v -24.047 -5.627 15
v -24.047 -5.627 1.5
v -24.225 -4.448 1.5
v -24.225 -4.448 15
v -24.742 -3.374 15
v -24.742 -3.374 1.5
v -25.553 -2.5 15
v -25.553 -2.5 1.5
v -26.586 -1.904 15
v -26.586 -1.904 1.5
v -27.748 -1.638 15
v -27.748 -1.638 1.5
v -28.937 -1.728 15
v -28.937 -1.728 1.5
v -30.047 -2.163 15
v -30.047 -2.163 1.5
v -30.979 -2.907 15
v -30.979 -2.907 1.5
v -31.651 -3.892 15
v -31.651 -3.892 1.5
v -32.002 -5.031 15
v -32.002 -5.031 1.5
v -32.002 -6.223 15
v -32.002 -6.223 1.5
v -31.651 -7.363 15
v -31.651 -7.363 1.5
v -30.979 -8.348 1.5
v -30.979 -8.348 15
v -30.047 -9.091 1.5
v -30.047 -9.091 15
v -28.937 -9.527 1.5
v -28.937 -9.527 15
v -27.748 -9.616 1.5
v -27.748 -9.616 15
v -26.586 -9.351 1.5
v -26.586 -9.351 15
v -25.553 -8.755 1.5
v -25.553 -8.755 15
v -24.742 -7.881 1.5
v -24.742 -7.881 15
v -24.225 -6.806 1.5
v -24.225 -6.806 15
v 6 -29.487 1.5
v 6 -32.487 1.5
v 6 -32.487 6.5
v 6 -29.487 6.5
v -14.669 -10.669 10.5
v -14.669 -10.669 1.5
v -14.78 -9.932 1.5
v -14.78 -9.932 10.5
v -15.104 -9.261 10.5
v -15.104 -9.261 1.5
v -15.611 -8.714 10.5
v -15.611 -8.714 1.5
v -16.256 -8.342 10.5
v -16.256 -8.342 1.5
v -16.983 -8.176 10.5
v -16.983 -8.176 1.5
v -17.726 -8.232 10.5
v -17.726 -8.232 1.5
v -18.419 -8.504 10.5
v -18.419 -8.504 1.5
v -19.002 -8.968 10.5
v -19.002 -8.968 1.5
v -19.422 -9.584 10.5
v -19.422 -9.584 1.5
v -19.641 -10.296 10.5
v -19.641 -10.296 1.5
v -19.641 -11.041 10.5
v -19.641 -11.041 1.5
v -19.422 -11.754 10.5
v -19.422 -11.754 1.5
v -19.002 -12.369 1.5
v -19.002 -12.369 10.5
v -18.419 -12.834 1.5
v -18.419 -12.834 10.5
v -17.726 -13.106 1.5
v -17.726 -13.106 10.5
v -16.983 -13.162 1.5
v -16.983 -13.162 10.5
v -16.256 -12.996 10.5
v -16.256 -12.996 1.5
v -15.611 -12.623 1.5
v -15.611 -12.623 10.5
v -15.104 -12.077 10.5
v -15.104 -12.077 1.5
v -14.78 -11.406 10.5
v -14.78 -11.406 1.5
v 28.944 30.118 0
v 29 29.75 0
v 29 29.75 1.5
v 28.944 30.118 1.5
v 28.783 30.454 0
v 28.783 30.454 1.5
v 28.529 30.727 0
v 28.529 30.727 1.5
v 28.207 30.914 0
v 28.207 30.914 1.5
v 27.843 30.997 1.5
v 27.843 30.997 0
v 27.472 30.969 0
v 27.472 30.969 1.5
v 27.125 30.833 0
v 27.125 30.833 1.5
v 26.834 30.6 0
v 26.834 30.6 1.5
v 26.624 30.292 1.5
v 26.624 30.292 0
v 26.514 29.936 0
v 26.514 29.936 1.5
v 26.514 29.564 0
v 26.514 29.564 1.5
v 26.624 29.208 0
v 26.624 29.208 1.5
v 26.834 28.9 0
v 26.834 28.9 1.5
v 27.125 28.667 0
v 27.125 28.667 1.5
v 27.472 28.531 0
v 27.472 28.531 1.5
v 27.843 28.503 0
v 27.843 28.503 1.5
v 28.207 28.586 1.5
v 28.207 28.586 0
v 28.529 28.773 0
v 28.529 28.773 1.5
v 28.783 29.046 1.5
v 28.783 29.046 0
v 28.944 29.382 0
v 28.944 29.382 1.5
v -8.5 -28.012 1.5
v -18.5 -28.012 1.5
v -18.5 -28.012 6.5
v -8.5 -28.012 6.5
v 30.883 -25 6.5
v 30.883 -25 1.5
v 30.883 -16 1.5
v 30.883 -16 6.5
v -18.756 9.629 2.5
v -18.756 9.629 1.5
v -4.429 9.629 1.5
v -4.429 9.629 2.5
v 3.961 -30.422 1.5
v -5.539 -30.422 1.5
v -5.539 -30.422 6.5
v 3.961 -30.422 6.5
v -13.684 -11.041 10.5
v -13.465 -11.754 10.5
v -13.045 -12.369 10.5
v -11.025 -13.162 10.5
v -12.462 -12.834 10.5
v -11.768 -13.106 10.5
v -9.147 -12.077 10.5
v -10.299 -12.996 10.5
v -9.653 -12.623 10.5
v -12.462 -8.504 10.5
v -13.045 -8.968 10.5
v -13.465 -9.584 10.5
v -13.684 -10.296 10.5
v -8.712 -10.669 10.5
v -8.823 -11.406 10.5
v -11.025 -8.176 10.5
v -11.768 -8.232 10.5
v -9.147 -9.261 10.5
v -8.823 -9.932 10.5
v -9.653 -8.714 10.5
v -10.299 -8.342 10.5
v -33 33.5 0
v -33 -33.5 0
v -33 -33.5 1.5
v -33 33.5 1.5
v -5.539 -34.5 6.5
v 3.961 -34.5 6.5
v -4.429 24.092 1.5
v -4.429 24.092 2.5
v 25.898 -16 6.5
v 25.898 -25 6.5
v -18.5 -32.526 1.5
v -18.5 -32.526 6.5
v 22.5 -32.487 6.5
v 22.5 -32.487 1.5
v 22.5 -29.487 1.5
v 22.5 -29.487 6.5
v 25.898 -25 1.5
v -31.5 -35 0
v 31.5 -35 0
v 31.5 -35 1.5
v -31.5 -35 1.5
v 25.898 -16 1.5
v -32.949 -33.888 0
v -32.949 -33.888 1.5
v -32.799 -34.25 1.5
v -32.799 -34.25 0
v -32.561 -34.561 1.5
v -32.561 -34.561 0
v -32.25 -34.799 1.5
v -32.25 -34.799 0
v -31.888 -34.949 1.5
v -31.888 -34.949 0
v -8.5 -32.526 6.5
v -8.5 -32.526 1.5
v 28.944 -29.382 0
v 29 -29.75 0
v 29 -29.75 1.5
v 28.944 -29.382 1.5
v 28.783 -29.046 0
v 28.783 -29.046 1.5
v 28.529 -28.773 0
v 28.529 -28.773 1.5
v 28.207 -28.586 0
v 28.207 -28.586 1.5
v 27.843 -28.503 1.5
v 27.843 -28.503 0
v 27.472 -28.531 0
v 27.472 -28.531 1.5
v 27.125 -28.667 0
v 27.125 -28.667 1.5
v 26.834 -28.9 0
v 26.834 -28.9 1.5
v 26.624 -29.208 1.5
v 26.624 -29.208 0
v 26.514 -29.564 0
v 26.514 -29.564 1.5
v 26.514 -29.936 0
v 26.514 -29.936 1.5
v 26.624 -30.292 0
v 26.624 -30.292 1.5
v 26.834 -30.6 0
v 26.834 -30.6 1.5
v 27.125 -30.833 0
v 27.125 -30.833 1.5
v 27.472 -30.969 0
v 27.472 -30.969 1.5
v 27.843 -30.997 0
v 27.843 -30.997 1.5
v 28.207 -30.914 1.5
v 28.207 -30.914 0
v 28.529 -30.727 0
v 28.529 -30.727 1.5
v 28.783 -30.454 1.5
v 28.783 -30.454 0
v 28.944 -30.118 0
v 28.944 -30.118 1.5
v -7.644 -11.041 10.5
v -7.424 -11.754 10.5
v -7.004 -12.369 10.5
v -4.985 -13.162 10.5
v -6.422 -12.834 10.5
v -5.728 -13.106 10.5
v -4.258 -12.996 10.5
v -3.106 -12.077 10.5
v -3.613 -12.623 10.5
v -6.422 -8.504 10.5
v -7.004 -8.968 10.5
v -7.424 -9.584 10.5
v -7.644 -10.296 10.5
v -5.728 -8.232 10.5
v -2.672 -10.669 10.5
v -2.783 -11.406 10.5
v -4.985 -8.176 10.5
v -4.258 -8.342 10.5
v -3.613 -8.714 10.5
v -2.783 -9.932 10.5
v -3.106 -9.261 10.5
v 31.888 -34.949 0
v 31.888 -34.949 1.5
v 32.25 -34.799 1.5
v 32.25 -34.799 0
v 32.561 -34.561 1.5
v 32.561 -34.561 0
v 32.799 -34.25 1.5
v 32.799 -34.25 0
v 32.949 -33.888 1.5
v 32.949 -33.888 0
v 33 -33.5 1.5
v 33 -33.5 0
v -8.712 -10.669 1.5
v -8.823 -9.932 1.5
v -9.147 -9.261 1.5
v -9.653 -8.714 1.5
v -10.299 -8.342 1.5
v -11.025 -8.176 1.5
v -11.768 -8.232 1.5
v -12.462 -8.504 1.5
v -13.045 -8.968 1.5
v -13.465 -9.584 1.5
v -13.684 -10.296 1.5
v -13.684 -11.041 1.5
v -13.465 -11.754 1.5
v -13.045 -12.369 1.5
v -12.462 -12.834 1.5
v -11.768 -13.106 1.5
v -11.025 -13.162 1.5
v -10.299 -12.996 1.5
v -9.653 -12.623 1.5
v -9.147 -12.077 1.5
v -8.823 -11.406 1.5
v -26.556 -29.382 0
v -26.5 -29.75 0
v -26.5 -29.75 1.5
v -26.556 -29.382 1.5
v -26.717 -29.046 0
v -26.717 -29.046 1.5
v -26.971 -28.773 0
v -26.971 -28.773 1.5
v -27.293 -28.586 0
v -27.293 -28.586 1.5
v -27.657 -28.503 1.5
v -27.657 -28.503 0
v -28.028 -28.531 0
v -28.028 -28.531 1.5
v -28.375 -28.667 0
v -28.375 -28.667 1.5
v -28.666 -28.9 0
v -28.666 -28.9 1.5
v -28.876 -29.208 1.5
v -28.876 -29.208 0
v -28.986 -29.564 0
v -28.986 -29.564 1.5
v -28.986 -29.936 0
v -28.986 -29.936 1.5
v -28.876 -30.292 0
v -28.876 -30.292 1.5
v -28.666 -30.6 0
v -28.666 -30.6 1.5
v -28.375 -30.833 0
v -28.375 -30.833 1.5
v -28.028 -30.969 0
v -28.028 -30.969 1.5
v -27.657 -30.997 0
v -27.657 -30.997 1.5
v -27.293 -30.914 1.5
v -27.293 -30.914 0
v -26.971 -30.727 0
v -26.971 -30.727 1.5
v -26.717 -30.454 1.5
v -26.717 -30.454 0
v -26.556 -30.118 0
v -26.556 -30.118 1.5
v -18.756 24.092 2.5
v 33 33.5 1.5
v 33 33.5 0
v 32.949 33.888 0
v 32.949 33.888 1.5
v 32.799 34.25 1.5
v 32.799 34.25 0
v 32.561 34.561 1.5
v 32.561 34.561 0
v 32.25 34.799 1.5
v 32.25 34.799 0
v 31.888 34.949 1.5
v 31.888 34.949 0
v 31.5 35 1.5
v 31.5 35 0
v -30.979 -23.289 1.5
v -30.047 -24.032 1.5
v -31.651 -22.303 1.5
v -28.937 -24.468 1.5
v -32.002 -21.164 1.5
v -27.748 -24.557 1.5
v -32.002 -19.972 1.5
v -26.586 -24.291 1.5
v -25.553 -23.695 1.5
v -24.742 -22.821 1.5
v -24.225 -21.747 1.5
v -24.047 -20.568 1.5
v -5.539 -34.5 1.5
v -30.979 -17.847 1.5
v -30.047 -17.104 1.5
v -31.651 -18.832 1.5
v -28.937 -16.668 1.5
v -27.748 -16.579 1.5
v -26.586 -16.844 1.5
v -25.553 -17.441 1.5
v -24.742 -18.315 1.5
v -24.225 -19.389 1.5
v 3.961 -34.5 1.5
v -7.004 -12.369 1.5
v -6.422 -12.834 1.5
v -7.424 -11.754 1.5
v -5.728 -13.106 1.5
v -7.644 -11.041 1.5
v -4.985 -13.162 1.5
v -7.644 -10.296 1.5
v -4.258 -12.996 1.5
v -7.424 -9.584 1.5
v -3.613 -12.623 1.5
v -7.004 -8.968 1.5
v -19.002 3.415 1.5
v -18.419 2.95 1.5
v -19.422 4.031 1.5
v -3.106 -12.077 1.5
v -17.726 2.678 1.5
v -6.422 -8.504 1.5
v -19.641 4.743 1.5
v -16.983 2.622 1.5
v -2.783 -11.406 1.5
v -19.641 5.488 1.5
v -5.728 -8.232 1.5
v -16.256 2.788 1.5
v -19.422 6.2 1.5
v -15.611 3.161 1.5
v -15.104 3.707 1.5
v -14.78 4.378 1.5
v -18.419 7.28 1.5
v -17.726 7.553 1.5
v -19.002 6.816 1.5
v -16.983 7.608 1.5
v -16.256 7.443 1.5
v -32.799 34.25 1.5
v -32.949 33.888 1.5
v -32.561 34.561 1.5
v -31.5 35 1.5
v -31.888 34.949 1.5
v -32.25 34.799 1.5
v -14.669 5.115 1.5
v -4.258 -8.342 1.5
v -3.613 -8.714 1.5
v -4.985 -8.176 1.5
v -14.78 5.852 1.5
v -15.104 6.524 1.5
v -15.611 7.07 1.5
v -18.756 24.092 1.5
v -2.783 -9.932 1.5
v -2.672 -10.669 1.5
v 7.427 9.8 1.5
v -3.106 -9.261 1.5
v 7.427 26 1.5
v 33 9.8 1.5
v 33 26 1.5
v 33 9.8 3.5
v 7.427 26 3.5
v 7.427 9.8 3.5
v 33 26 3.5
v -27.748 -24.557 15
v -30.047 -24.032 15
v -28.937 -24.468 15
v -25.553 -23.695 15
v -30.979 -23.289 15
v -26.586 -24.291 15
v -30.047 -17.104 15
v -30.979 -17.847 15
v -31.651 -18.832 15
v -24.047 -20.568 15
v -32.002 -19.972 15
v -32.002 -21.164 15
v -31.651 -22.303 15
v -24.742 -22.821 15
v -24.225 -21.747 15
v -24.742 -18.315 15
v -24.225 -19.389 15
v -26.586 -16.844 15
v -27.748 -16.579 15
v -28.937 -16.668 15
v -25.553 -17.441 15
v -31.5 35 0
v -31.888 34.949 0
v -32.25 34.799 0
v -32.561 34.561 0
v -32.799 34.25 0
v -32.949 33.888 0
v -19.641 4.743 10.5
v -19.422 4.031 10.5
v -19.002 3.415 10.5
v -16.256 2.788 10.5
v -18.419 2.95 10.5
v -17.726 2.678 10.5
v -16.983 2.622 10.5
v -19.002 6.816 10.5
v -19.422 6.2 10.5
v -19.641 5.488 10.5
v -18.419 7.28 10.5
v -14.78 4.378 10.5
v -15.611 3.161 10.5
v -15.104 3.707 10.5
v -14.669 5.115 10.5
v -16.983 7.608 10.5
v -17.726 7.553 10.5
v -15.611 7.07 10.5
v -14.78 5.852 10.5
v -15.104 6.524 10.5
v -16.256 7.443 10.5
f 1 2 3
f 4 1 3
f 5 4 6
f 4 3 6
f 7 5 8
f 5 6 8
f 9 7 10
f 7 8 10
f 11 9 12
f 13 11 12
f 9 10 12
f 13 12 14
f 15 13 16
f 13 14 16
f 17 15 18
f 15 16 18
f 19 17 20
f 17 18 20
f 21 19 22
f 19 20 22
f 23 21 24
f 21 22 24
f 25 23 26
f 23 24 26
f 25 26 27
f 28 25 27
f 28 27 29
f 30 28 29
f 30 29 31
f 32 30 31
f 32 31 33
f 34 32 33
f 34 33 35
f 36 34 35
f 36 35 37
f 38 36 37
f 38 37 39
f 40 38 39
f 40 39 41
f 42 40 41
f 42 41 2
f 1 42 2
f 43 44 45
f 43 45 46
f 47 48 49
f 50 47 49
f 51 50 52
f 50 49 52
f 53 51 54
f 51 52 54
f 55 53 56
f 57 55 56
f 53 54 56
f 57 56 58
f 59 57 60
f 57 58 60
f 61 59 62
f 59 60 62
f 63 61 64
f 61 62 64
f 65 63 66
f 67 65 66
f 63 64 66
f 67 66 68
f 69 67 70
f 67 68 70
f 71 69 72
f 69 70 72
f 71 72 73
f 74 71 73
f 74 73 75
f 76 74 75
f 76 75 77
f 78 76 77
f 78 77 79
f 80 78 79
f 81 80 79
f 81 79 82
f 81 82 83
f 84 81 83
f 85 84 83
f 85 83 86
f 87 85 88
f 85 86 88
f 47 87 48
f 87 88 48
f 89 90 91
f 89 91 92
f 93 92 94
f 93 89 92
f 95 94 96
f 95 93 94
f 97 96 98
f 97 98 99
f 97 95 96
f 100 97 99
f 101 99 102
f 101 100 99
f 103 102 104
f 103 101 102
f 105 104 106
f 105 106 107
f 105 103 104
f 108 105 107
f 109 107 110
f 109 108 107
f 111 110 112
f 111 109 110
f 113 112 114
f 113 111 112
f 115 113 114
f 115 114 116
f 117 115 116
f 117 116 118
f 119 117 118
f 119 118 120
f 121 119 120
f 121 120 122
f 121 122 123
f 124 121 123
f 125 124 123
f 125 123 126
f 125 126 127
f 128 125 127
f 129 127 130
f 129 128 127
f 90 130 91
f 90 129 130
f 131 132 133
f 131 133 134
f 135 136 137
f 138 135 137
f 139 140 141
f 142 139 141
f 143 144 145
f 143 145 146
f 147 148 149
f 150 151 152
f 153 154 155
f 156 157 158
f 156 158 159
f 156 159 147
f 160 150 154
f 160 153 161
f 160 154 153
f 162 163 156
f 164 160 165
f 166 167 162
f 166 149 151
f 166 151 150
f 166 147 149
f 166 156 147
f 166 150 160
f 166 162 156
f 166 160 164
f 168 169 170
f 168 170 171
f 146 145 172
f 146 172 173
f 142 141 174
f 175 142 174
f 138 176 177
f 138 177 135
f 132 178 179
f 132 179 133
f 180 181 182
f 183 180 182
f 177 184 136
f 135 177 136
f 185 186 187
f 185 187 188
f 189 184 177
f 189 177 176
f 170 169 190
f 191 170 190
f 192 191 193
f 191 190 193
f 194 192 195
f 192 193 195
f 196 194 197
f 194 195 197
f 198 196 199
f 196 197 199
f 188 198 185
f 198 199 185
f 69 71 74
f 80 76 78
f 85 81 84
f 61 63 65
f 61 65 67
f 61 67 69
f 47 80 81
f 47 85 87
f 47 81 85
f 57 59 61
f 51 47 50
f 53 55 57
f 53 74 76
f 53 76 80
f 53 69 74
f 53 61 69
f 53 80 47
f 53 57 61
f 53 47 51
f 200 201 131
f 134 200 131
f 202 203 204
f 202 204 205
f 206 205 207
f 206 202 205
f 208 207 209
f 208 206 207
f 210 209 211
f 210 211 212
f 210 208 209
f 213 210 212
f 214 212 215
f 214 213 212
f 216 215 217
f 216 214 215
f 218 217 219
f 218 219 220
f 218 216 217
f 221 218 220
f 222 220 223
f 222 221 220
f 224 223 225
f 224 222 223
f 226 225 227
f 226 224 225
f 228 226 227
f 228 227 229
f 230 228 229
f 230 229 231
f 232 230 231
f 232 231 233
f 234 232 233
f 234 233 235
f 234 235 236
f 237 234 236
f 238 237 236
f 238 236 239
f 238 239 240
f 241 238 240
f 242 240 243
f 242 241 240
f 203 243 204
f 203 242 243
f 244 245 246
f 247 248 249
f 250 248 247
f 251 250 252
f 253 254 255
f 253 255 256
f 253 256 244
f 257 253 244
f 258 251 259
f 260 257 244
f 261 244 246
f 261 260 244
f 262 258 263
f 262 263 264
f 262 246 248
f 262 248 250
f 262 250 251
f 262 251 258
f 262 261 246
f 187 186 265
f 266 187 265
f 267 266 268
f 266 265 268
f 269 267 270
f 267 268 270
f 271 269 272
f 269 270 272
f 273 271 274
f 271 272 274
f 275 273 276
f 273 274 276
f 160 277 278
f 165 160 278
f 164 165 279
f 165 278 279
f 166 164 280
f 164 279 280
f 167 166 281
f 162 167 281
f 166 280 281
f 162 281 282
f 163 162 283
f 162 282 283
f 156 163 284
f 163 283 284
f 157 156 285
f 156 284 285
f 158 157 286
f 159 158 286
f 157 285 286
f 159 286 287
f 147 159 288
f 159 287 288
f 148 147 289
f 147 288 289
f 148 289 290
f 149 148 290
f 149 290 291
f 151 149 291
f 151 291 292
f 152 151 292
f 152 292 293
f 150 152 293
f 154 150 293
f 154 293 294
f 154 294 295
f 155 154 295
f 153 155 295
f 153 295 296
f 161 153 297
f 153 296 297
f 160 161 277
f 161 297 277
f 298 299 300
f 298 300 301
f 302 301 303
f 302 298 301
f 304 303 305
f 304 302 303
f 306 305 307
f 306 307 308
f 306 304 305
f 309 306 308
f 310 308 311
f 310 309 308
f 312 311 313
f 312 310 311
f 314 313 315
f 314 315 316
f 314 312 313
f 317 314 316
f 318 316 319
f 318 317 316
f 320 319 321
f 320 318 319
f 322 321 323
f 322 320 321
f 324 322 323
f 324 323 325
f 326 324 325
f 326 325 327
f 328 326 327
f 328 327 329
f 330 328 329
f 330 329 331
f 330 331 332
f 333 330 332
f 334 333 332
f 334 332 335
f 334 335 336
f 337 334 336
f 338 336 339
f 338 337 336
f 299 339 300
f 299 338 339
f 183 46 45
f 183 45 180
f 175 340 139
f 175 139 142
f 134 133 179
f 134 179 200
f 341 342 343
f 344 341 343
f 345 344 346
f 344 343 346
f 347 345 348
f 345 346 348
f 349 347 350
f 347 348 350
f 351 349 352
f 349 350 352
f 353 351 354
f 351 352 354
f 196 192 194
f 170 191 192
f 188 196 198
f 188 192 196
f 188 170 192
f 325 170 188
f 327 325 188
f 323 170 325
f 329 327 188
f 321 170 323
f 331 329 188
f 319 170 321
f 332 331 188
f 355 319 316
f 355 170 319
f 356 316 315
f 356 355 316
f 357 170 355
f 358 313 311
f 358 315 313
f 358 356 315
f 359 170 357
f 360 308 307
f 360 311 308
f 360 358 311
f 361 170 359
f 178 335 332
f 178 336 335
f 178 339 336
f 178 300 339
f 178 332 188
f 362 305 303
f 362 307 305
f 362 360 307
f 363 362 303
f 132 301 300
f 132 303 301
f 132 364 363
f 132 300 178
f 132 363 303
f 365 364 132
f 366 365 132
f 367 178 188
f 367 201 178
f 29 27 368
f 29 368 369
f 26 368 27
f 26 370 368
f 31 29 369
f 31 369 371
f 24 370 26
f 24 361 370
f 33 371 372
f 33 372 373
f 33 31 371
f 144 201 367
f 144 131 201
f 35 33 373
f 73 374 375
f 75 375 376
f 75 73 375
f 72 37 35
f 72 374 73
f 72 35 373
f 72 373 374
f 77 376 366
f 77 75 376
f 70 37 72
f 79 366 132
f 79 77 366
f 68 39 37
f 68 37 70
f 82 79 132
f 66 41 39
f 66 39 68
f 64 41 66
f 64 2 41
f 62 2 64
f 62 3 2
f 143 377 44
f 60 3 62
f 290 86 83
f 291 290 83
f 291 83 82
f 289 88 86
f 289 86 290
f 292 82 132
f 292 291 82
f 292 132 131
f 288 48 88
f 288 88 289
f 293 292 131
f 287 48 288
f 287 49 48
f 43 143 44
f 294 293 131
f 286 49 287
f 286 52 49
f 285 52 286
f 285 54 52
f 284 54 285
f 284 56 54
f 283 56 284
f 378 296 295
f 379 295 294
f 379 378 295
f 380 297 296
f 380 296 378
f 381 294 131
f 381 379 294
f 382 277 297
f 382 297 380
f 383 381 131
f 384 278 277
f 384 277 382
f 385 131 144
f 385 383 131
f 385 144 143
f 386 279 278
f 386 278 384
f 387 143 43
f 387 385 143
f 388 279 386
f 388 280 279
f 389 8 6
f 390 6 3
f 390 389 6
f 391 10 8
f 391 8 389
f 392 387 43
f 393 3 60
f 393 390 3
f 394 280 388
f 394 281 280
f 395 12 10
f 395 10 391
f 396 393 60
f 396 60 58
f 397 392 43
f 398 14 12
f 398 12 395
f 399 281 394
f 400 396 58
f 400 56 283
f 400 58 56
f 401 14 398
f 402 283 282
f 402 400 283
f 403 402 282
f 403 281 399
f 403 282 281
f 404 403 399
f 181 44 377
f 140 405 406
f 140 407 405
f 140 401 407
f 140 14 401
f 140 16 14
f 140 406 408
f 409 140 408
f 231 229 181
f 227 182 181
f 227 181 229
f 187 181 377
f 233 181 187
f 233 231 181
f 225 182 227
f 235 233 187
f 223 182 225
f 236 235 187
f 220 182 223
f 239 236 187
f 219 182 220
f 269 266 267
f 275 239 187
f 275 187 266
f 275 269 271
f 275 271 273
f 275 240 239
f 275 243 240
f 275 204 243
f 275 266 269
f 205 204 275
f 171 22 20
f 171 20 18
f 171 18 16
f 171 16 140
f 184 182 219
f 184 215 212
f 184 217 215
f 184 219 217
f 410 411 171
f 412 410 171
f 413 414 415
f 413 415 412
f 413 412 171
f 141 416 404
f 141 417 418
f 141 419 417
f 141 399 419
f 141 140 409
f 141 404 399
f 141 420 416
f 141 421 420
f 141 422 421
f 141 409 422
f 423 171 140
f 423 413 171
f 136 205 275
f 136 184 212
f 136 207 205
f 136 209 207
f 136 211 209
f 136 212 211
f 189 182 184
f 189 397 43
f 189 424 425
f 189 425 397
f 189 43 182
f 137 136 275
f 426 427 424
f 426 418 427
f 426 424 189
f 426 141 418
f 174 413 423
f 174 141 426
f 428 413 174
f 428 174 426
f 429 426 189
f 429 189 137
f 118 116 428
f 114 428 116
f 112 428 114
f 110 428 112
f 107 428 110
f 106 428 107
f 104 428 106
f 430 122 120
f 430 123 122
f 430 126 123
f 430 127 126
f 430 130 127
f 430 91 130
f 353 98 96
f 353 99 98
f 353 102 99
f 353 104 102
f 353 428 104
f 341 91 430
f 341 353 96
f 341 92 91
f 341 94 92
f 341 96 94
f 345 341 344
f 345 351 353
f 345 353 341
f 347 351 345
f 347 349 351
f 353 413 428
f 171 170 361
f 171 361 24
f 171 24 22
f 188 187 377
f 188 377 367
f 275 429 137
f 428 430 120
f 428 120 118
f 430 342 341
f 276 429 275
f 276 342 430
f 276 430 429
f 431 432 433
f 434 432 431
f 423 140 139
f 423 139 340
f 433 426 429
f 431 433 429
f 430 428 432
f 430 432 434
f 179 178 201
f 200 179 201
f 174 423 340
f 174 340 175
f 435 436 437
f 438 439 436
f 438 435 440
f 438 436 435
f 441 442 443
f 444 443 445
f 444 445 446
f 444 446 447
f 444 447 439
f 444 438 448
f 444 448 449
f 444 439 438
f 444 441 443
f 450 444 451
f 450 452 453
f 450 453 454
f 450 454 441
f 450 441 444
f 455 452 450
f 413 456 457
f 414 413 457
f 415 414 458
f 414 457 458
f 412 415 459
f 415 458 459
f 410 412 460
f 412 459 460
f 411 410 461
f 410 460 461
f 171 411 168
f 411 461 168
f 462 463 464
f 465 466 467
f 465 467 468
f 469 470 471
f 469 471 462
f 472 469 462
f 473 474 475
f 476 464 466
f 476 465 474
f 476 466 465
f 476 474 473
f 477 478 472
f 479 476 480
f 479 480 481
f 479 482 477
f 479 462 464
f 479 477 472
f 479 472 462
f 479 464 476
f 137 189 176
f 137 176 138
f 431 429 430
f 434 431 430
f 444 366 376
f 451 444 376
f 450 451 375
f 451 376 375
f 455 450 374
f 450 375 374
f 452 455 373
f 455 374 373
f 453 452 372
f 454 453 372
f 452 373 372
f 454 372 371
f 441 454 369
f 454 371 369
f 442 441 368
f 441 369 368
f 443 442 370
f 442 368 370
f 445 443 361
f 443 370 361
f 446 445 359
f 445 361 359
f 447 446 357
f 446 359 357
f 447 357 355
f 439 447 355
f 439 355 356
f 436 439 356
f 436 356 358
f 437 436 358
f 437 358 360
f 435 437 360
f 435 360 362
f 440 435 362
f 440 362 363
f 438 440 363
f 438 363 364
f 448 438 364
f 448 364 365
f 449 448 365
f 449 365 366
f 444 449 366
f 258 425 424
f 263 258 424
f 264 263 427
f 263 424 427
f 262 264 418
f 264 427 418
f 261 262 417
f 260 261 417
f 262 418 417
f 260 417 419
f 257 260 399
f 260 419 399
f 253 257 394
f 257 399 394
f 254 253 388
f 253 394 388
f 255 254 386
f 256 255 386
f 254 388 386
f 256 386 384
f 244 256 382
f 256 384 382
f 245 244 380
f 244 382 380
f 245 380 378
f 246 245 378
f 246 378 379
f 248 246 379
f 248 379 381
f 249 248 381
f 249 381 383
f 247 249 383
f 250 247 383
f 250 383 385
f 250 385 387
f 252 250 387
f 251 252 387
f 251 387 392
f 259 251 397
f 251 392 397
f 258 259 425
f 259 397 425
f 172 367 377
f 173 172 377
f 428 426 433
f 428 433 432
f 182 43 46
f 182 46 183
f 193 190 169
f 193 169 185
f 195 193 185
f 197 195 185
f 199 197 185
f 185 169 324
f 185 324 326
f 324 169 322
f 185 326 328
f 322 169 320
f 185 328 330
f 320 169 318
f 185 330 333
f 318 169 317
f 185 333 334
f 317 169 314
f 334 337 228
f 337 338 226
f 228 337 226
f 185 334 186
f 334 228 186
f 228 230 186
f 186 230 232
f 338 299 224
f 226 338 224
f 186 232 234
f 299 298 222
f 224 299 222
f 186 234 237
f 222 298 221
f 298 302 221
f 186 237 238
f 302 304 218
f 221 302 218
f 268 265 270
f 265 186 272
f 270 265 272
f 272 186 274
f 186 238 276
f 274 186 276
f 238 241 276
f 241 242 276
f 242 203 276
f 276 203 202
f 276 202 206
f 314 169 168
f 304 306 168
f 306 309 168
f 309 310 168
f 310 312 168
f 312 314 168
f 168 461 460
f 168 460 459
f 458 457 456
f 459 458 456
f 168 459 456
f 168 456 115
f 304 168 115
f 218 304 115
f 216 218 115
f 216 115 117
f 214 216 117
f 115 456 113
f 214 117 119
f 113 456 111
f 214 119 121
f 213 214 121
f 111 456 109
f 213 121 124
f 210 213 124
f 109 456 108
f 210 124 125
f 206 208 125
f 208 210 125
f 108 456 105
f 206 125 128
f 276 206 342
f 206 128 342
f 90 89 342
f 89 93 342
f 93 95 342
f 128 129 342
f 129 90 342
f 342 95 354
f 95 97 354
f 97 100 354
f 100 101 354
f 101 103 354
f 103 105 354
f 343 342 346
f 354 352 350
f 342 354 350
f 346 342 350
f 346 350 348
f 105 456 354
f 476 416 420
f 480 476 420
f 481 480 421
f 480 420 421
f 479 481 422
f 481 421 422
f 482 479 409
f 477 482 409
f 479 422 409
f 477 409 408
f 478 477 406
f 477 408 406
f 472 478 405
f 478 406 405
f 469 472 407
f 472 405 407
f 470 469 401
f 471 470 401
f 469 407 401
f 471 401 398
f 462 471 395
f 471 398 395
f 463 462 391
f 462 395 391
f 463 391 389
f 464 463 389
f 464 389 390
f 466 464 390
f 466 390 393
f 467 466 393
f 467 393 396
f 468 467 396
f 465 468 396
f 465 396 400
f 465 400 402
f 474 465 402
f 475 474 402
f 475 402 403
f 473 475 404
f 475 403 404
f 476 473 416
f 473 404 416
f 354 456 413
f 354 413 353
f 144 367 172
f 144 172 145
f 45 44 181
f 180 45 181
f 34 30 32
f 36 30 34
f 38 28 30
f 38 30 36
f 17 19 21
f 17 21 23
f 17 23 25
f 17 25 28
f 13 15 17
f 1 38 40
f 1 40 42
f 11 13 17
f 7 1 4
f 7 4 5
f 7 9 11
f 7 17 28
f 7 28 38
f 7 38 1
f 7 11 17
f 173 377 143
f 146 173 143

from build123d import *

# Parameters (mm, degrees)
SKETCH_R      = 1.25
PAD_DEPTH     = 1.5
SKETCH001_R   = 4
PAD001_DEPTH  = 15
SKETCH002_W   = 14.327426
SKETCH002_H   = 14.462592
PAD002_DEPTH  = 1
SKETCH003_R   = 2.5
PAD003_DEPTH  = 9
SKETCH004_W   = 10
SKETCH004_H   = 4.51462
SKETCH004_W_2 = 9.5
SKETCH004_H_2 = 4.078131
SKETCH004_W_3 = 16.5
SKETCH004_H_3 = 3
PAD004_DEPTH  = 5
SKETCH005_W   = 25.572927
SKETCH005_H   = 16.2
PAD005_DEPTH  = 2
SKETCH006_W   = 4.984948
SKETCH006_H   = 9
PAD006_DEPTH  = 5


with BuildPart() as part:
    # Sketch → Pad (new body)
    with BuildSketch(Plane.XY):
        with BuildLine():
            ThreePointArc((-31.5, 35), (-32.56066, 34.56066), (-33, 33.5))
            Line((-33, -33.5), (-33, 33.5))
            ThreePointArc((-33, -33.5), (-32.56066, -34.56066), (-31.5, -35))
            Line((31.5, -35), (-31.5, -35))
            ThreePointArc((31.5, -35), (32.56066, -34.56066), (33, -33.5))
            Line((33, 33.5), (33, -33.5))
            ThreePointArc((33, 33.5), (32.56066, 34.56066), (31.5, 35))
            Line((-31.5, 35), (31.5, 35))
        make_face()
        with Locations((27.75, 29.75)):
            Circle(SKETCH_R, mode=Mode.SUBTRACT)
        with Locations((-27.75, -29.75)):
            Circle(SKETCH_R, mode=Mode.SUBTRACT)
        with Locations((27.75, -29.75)):
            Circle(SKETCH_R, mode=Mode.SUBTRACT)
    extrude(amount=PAD_DEPTH)

    # Sketch001 → Pad001 (join)
    with BuildSketch(Plane.XY):
        with Locations((-28.04706, -5.627252)):
            Circle(SKETCH001_R)
        with Locations((-28.04706, -20.567915)):
            Circle(SKETCH001_R)
    extrude(amount=PAD001_DEPTH)

    # Sketch002 (on DatumPlane) → Pad002 (join)
    with BuildSketch(Plane.XY.offset(1.5)):
        with Locations((-11.592608, 16.860297)):
            Rectangle(SKETCH002_W, SKETCH002_H)
    extrude(amount=PAD002_DEPTH)

    # Sketch003 (on DatumPlane) → Pad003 (join)
    with BuildSketch(Plane.XY.offset(1.5)):
        with Locations((-17.169403, 5.115318)):
            Circle(SKETCH003_R)
        with Locations((-17.169403, -10.668831)):
            Circle(SKETCH003_R)
        with Locations((-11.212177, -10.668831)):
            Circle(SKETCH003_R)
        with Locations((-5.171722, -10.668831)):
            Circle(SKETCH003_R)
    extrude(amount=PAD003_DEPTH)

    # Sketch004 (on DatumPlane) → Pad004 (join)
    with BuildSketch(Plane.XY.offset(1.5)):
        with Locations((-13.5, -30.268985)):
            Rectangle(SKETCH004_W, SKETCH004_H)
        with Locations((-0.789347, -32.460935)):
            Rectangle(SKETCH004_W_2, SKETCH004_H_2)
        with Locations((14.25, -30.987146)):
            Rectangle(SKETCH004_W_3, SKETCH004_H_3)
    extrude(amount=PAD004_DEPTH)

    # Sketch005 (on Face5 of Pad004) → Pad005 (join)
    with BuildSketch(Plane.XY.offset(1.5)):
        with Locations((20.213537, 17.9)):
            Rectangle(SKETCH005_W, SKETCH005_H)
    extrude(amount=PAD005_DEPTH)

    # Sketch006 (on DatumPlane) → Pad006 (join)
    with BuildSketch(Plane.XY.offset(1.5)):
        with Locations((28.390791, -20.5)):
            Rectangle(SKETCH006_W, SKETCH006_H)
    extrude(amount=PAD006_DEPTH)


solid = part.part
